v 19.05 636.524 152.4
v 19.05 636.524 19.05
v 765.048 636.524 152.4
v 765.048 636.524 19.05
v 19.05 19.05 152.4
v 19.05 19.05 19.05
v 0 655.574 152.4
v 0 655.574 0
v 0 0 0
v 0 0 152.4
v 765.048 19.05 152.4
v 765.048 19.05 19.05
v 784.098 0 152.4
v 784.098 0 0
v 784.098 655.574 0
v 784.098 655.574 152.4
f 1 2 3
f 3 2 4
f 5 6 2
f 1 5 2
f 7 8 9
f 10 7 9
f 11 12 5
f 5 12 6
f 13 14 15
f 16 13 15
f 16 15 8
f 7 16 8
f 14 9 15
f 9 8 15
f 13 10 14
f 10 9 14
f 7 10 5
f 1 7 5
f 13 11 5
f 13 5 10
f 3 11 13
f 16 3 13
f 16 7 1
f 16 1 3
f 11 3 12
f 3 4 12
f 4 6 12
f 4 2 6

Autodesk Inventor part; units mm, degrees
ref_plane "YZ Plane" through (0, 0, 0) normal (1, 0, 0) x (0, 1, 0)
ref_plane "XZ Plane" through (0, 0, 0) normal (0, 1, 0) x (-1, 0, 0)
ref_plane "XY Plane" through (0, 0, 0) normal (0, 0, 1) x (1, 0, 0)
sketch "Sketch1" plane through (0, 0, 0) normal (0, 0, 1) x (1, 0, 0)
  line L0 (0, 0) -> (784.098, 0)
  line L1 (784.098, 0) -> (784.098, 655.574)
  line L2 (784.098, 655.574) -> (0, 655.574)
  line L3 (0, 655.574) -> (0, 0)
  dimension "d0" = 784.098
  dimension "d1" = 655.574
extrude "Extrusion1" add sketch "Sketch1" along normal blind 19.05
sketch "Sketch2" plane through (0, 0, 19.05) normal (0, 0, 1) x (1, 0, 0)
  line L0 (784.098, 0) -> (784.098, 655.574) projected
  line L1 (0, 0) -> (784.098, 0)
  line L2 (784.098, 0) -> (784.098, 655.574)
  line L3 (784.098, 655.574) -> (0, 655.574)
  line L4 (0, 655.574) -> (0, 0)
  line L5 (19.05, 636.524) -> (765.048, 636.524)
  line L6 (765.048, 636.524) -> (765.048, 19.05)
  line L7 (765.048, 19.05) -> (19.05, 19.05)
  line L8 (19.05, 19.05) -> (19.05, 636.524)
  dimension "d4" = 19.05
extrude "Extrusion2" add sketch "Sketch2" along normal blind 133.35
properties part number "Temporary Platform"
